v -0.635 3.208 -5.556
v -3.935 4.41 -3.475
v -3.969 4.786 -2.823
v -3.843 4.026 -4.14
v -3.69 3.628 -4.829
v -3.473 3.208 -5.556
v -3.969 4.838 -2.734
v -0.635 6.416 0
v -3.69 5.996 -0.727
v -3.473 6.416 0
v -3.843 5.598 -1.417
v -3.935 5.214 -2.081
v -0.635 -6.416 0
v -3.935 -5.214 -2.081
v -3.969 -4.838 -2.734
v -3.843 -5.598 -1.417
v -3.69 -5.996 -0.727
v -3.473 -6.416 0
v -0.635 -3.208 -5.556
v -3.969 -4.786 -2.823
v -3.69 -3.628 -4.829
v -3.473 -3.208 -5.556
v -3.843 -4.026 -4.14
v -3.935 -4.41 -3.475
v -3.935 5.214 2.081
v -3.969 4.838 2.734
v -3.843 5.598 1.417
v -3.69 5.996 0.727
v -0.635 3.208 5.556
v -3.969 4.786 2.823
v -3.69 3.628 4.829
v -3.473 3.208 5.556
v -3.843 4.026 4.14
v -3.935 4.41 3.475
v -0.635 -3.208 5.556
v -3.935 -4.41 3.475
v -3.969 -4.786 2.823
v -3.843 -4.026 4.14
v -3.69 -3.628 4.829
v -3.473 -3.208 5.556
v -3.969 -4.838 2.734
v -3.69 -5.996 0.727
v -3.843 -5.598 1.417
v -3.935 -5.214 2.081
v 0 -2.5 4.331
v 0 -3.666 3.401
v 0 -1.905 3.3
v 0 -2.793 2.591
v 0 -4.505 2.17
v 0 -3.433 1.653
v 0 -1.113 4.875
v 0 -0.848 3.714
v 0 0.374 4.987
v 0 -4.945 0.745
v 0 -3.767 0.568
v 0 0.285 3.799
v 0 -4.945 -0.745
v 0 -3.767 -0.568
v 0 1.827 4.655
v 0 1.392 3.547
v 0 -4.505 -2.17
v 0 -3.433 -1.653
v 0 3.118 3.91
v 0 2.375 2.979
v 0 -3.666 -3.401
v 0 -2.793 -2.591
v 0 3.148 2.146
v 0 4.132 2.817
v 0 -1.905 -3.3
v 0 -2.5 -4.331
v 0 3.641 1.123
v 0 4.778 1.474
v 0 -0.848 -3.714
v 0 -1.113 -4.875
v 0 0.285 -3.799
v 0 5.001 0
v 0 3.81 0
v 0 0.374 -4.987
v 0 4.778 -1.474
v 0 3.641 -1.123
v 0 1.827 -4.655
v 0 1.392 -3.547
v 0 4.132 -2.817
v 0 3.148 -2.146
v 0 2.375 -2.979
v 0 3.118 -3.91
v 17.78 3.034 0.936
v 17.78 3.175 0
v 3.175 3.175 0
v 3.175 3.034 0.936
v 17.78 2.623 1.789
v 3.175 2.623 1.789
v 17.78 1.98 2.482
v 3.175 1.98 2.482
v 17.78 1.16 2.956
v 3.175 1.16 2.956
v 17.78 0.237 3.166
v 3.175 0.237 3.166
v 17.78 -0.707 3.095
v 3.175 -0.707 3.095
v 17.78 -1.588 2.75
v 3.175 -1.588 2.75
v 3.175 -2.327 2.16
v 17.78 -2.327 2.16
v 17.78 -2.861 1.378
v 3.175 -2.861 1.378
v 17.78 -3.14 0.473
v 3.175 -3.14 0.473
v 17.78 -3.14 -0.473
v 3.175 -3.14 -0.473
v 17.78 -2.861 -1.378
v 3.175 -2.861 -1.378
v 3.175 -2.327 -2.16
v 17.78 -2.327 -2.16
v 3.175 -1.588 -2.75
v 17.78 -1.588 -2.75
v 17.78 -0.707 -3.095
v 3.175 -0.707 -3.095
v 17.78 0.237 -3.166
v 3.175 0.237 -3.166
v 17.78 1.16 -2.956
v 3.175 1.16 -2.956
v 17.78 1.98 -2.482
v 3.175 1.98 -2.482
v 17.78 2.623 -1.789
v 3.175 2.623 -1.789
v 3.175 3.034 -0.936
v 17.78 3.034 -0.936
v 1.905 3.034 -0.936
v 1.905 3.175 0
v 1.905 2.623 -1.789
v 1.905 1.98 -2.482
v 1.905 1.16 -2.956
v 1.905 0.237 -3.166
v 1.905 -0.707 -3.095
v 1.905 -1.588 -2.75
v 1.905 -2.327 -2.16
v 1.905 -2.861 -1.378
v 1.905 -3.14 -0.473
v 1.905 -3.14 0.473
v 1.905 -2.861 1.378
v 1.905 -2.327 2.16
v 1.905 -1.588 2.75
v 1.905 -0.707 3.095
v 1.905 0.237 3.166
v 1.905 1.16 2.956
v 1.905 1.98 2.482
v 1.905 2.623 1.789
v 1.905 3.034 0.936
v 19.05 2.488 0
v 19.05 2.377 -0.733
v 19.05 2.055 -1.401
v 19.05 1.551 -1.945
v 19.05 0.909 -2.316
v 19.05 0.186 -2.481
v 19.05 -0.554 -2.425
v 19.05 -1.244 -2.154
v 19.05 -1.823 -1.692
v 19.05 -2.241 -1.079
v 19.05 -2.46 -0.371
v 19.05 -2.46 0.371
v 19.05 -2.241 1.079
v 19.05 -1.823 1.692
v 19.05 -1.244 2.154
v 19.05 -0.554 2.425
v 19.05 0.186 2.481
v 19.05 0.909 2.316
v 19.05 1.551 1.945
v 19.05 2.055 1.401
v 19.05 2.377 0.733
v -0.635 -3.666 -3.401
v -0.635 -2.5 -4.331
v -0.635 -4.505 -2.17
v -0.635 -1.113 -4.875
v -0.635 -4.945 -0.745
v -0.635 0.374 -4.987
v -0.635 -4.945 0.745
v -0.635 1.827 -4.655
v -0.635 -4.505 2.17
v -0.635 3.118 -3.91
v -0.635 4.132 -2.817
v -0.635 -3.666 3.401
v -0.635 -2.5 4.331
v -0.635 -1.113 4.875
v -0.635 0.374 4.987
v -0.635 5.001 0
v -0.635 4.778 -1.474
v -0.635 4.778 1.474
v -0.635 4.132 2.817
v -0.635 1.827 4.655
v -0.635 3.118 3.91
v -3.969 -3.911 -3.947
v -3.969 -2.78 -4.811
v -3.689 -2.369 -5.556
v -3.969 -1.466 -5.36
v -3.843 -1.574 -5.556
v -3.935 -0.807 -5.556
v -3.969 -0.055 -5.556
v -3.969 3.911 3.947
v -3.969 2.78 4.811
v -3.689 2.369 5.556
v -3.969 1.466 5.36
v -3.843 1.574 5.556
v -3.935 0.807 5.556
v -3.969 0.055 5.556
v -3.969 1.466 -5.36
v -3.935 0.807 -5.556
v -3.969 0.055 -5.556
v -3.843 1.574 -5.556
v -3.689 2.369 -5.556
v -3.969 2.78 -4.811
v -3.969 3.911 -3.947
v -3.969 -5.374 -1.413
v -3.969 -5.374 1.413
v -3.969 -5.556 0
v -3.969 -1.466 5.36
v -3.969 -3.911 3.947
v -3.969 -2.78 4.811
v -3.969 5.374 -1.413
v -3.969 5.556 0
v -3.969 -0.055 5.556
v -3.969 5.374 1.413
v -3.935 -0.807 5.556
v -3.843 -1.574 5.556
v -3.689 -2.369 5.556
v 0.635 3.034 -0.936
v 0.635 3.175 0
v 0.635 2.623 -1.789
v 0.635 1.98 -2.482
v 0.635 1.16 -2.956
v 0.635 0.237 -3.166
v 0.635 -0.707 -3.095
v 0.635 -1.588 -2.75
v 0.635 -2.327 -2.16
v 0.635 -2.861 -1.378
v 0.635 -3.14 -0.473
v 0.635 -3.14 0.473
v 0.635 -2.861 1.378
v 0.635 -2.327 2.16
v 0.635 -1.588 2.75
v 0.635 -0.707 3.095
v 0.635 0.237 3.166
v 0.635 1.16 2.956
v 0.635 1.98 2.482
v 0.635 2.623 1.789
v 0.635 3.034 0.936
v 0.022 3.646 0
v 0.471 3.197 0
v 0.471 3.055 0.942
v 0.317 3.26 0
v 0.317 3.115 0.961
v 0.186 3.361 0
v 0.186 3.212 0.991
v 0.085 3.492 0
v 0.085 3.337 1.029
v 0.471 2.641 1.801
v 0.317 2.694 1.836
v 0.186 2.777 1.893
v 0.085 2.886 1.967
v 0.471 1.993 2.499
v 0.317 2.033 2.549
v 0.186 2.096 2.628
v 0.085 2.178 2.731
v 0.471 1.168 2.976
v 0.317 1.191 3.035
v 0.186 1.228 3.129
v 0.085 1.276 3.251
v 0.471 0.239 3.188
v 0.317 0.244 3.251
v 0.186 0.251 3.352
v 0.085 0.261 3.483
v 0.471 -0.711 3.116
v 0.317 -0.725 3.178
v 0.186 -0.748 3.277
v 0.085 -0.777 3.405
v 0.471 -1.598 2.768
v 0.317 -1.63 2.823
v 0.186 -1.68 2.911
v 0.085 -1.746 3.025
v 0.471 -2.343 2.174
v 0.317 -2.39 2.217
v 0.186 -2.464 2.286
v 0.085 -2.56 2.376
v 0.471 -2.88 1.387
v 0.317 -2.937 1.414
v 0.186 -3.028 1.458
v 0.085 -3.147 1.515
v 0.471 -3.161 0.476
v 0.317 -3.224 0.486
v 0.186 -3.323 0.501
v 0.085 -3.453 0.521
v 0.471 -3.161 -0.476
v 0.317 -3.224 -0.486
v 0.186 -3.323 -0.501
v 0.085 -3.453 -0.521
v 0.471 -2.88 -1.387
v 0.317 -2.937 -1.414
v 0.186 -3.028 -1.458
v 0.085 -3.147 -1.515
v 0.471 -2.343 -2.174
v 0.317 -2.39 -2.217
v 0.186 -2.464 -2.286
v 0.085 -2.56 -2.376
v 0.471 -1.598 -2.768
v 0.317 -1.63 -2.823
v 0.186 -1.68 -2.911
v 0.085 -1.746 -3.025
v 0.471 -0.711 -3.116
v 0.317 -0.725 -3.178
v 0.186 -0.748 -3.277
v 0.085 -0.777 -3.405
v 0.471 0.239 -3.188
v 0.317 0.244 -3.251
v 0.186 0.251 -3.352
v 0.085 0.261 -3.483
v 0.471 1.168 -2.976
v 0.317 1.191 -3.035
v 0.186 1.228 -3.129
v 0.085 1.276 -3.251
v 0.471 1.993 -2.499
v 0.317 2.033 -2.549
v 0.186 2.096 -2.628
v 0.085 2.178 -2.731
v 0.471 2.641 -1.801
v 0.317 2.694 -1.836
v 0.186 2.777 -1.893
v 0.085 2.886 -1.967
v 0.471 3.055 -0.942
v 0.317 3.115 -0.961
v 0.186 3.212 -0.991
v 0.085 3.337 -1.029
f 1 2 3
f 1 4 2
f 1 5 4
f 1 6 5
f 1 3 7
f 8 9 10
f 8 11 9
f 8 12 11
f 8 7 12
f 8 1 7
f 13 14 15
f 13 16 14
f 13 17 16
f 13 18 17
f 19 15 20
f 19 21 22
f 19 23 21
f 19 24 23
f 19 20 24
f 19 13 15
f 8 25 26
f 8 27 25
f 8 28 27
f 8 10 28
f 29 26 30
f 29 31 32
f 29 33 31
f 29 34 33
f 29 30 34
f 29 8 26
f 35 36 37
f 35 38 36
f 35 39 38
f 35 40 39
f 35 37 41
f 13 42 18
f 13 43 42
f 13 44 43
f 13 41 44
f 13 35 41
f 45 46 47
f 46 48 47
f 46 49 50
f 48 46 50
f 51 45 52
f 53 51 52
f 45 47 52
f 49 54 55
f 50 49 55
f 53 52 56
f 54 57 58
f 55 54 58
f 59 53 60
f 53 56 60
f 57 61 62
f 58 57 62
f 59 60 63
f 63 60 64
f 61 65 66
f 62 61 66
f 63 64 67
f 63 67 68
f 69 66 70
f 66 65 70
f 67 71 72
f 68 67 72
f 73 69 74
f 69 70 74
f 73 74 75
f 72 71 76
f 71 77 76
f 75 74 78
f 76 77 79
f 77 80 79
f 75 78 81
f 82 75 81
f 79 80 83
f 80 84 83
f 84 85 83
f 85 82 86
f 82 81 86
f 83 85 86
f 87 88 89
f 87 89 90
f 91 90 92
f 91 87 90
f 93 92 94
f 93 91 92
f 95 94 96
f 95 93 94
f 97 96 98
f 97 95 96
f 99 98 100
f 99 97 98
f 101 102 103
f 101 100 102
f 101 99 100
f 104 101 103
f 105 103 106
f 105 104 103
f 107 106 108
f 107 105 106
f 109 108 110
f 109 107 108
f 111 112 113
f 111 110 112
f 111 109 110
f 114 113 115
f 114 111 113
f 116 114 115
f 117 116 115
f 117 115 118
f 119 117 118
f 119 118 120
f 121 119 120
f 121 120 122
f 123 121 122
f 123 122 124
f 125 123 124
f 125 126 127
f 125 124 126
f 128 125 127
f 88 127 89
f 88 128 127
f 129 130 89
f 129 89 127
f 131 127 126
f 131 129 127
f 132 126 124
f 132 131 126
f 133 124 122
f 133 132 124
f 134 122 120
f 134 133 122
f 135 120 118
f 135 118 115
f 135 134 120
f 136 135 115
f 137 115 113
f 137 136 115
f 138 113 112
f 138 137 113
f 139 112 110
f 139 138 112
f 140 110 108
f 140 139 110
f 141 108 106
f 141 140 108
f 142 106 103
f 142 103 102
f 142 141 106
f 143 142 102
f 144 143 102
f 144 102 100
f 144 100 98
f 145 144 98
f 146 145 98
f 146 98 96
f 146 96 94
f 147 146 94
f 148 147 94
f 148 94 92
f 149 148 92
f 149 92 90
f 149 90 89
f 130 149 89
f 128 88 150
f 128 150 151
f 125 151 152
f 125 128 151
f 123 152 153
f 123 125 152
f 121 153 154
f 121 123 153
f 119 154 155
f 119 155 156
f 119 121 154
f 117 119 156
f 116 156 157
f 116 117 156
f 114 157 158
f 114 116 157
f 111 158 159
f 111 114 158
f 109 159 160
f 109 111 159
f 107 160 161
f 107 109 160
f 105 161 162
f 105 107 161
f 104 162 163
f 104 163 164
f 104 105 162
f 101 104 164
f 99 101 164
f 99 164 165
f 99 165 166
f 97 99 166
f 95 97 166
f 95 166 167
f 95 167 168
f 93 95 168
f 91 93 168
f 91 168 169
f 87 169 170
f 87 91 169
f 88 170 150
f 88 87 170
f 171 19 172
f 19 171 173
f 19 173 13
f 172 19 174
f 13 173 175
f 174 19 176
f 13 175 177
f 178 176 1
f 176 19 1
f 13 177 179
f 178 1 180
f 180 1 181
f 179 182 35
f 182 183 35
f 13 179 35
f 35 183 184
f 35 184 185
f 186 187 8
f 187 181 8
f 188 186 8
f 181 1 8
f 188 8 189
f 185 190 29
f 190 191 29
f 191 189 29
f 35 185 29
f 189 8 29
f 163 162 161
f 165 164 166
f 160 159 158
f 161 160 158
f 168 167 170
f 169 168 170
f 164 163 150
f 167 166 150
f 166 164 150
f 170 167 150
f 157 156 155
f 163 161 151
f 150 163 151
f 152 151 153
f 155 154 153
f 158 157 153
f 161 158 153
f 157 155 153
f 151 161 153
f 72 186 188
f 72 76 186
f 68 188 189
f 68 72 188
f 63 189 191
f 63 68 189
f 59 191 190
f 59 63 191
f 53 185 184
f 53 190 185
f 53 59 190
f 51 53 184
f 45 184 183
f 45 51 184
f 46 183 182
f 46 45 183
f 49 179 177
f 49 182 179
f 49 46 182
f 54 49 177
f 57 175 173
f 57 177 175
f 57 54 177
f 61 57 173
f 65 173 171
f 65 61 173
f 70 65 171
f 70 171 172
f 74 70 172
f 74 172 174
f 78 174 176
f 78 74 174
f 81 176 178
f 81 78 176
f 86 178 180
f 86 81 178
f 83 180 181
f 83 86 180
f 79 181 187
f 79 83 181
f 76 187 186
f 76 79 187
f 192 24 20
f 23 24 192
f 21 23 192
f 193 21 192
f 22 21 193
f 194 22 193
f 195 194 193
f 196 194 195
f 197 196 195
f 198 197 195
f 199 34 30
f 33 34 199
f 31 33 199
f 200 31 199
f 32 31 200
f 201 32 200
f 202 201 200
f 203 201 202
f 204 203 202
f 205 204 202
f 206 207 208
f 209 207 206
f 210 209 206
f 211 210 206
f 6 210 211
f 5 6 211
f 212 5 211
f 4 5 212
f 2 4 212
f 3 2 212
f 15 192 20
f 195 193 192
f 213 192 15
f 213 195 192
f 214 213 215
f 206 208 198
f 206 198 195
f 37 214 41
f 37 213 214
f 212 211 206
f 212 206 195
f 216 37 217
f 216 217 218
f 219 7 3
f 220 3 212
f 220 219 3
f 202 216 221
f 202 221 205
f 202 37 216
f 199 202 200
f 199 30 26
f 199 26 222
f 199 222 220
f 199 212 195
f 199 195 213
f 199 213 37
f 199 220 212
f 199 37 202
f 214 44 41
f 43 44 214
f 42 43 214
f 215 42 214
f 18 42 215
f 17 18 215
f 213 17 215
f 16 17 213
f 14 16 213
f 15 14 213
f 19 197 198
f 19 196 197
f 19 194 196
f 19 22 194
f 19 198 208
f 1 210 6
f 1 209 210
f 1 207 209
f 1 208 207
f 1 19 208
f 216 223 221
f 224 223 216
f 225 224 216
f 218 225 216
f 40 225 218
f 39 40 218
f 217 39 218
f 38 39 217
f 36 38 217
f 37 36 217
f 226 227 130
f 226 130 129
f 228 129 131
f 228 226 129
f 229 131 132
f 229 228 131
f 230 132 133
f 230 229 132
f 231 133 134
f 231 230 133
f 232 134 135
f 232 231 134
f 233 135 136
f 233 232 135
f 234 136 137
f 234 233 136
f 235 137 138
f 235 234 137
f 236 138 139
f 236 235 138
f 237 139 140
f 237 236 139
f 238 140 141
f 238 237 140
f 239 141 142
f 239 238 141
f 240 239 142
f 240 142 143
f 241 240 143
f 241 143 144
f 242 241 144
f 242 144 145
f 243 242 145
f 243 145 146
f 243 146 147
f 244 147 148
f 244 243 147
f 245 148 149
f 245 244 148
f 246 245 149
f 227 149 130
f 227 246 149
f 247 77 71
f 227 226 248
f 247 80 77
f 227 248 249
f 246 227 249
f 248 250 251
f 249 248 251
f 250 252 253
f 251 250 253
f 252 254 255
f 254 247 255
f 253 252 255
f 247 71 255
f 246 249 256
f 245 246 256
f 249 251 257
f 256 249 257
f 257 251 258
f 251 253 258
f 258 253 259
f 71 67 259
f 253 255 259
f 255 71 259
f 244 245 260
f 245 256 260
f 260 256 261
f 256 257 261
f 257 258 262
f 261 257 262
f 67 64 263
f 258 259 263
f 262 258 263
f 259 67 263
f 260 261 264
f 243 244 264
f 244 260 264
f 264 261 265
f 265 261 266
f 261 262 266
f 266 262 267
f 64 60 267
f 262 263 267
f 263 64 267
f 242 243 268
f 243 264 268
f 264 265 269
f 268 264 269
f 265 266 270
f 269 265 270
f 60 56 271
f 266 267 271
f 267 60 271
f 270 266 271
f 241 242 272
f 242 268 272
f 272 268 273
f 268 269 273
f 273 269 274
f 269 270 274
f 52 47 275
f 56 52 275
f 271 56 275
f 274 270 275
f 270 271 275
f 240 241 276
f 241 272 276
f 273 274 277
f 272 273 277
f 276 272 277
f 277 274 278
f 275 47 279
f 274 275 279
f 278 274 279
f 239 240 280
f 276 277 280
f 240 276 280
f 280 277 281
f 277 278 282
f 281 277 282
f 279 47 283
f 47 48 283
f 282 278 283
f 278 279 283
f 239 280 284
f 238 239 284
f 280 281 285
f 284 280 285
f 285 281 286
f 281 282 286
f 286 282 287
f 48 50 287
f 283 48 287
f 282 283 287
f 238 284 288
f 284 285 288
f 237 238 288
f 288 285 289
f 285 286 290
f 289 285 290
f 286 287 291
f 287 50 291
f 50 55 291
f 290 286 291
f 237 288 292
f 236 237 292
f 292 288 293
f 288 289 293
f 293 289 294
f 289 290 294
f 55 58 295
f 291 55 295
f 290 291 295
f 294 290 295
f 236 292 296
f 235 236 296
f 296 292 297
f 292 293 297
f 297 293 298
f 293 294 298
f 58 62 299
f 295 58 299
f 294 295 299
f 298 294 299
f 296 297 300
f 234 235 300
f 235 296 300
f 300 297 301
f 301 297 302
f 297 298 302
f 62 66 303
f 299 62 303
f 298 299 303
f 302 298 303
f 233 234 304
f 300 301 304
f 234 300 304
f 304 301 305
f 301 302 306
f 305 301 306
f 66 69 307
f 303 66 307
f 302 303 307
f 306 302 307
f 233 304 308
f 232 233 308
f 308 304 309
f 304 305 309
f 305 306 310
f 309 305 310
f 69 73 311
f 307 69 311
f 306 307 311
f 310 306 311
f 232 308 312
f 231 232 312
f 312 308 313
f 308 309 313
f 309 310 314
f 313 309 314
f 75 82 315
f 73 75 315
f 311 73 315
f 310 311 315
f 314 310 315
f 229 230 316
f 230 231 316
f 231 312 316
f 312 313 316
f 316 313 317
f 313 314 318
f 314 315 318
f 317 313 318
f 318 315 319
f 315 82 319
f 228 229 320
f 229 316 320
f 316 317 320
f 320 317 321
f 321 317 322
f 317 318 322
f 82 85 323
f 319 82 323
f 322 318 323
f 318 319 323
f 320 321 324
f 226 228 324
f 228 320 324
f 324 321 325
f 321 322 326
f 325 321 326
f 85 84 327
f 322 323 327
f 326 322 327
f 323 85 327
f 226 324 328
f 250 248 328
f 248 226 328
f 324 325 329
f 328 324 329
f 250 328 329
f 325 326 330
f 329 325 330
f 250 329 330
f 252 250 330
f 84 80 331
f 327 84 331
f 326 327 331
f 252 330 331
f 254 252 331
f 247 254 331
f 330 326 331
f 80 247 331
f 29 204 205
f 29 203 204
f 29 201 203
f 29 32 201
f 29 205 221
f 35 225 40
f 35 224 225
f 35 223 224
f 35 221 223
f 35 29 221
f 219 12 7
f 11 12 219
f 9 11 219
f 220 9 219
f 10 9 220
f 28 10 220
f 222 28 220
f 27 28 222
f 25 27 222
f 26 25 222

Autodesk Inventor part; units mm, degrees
ref_plane "YZ Plane" through (0, 0, 0) normal (1, 0, 0) x (0, 1, 0)
ref_plane "XZ Plane" through (0, 0, 0) normal (0, 1, 0) x (-1, 0, 0)
sketch "Sketch1" plane through (0, 0, 0) normal (0, 0, 1) x (1, 0, 0)
  line L0 (0, 5.0006) -> (0, 3.175)
  line L1 (3.175, 3.175) -> (19.05, 3.175)
  line L2 (19.05, 3.175) -> (19.05, 0)
  line L3 (19.05, 0) -> (-0.6351, 0)
  line L4 (-4.5721, 0) -> (22.987, 0) projected
  line L5 (-0.6351, 0) -> (-0.6351, 5.0006)
  line L6 (-0.6351, 5.0006) -> (0, 5.0006)
  line L7 (3.175, 3.175) -> (1.9049, 3.175)
  line L8 (1.9049, 3.175) -> (0, 3.175)
  line L9 (0, -1.0001) -> (0, 6.0007) projected
  dimension "d0" = 19.05
  dimension "d1" = 15.875
  dimension "d2" = 6.35
  dimension "d9" = 0.6351
  dimension "d10" = 10.0013
  dimension "d13" = 1.2701
  dimension "d14" = 6.35
revolve "Body" add sketch "Sketch1" angle 360 about axis through (19.05, 0, 0) along (-1, 0, 0)
sketch "Sketch2" plane through (-0.6351, 0, 0) normal (-1, 0, 0) x (0, 0, 1)
  line L0 (0, 6.4158) -> (5.5562, 3.2079)
  line L1 (5.5562, 3.2079) -> (5.5562, -3.2079)
  line L2 (5.5562, -3.2079) -> (0, -6.4158)
  line L3 (0, -6.4158) -> (-5.5562, -3.2079)
  line L4 (-5.5562, -3.2079) -> (-5.5562, 3.2079)
  line L5 (-5.5562, 3.2079) -> (0, 6.4158)
  point P0 (0, 0)
  point P1 (0, 0)
  dimension "d11" = 11.1125
extrude "Head" add sketch "Sketch2" along normal blind 3.3337
sketch "Sketch4" plane through (0, 0, 0) normal (0, 0, 1) x (1, 0, 0)
  line L0 (-3.9689, 5.5563) -> (-3.9689, 6.4158)
  line L1 (-3.9689, 6.4158) -> (-3.4726, 6.4158)
  line L2 (-3.4726, 6.4158) -> (-3.9689, 5.5563)
  line L3 (-4.6356, 0) -> (0.0317, 0) projected
  line L4 (-0.6351, 6.4158) -> (-3.9688, 6.4158) projected
  line L5 (-3.9688, 3.2079) -> (-3.9688, 6.4158) projected
  dimension "d5" = 30
  dimension "d19" = 11.1125
revolve "Chamfer1" cut sketch "Sketch4" angle 360 about axis through (-10, 0, 0) along (1, 0, 0)
thread "Thread" size "1/4-20 UNC" class "2A" standard "ANSI Unified Screw Threads" length 15.875
chamfer "Chamfer2" distance 0.6875 distance2 1.2701 1 edges at (19.05, -3.175, 0) measured on face at (19.05, -0.5663, 0.5832)
ref_plane "Work Plane1" through (1.525, 0, 0) normal (0, 0, 1) x (1, 0, 0)
fillet "Fillet2" radius 0.635 1 edges at (0, -3.175, 0)
equation "\"d0\" = NLG"
equation "\"d1\" = GEL"
equation "\"d2\" = GD"
equation "\"d10\" = SD2"
equation "\"d14\" = BDM"
equation "\"d11\" = SW"
equation "\"d3\" = KOH - SD"
equation "\"d5\" = ANG1"
equation "\"d19\" = SW0"
equation "\"d63\" = R"
equation "\"d15\" = GEL"
equation "\"d6\" = -0.5 * SPD + 0.5 * GD"
equation "\"NLG\" = 19.05"
equation "\"GD\" = NND"
equation "\"BDM\" = 6.35"
equation "\"KOH\" = 3.96875"
equation "\"GEL\" = 15.875"
equation "\"SW\" = 11.1125"
equation "\"SW0\" = SW"
equation "\"SPD\" = 4.9751"
equation "\"SD2\" = 10.00125"
equation "\"SD\" = 0.635"
equation "\"ANG1\" = 30deg"
equation "\"GAL\" = 1.27"
equation "\"GUL\" = 1.27"
equation "\"R\" = 0.635"
equation "\"d62\" = -NLG - SD + GUL"
equation "\"THREADDIA\" = 6.35"
equation "\"TOA\" = 30deg"
equation "\"RR\" = 0.254"
equation "\"NND\" = 6.35"
equation "\"E0\" = 1.155 * SW"
equation "\"SLG\" = 0"
equation "\"GD1\" = 4.9751"
properties part number "ANSI B18.2.1 - 1/4-20 UNC - 0.75" material "Steel, Mild"
